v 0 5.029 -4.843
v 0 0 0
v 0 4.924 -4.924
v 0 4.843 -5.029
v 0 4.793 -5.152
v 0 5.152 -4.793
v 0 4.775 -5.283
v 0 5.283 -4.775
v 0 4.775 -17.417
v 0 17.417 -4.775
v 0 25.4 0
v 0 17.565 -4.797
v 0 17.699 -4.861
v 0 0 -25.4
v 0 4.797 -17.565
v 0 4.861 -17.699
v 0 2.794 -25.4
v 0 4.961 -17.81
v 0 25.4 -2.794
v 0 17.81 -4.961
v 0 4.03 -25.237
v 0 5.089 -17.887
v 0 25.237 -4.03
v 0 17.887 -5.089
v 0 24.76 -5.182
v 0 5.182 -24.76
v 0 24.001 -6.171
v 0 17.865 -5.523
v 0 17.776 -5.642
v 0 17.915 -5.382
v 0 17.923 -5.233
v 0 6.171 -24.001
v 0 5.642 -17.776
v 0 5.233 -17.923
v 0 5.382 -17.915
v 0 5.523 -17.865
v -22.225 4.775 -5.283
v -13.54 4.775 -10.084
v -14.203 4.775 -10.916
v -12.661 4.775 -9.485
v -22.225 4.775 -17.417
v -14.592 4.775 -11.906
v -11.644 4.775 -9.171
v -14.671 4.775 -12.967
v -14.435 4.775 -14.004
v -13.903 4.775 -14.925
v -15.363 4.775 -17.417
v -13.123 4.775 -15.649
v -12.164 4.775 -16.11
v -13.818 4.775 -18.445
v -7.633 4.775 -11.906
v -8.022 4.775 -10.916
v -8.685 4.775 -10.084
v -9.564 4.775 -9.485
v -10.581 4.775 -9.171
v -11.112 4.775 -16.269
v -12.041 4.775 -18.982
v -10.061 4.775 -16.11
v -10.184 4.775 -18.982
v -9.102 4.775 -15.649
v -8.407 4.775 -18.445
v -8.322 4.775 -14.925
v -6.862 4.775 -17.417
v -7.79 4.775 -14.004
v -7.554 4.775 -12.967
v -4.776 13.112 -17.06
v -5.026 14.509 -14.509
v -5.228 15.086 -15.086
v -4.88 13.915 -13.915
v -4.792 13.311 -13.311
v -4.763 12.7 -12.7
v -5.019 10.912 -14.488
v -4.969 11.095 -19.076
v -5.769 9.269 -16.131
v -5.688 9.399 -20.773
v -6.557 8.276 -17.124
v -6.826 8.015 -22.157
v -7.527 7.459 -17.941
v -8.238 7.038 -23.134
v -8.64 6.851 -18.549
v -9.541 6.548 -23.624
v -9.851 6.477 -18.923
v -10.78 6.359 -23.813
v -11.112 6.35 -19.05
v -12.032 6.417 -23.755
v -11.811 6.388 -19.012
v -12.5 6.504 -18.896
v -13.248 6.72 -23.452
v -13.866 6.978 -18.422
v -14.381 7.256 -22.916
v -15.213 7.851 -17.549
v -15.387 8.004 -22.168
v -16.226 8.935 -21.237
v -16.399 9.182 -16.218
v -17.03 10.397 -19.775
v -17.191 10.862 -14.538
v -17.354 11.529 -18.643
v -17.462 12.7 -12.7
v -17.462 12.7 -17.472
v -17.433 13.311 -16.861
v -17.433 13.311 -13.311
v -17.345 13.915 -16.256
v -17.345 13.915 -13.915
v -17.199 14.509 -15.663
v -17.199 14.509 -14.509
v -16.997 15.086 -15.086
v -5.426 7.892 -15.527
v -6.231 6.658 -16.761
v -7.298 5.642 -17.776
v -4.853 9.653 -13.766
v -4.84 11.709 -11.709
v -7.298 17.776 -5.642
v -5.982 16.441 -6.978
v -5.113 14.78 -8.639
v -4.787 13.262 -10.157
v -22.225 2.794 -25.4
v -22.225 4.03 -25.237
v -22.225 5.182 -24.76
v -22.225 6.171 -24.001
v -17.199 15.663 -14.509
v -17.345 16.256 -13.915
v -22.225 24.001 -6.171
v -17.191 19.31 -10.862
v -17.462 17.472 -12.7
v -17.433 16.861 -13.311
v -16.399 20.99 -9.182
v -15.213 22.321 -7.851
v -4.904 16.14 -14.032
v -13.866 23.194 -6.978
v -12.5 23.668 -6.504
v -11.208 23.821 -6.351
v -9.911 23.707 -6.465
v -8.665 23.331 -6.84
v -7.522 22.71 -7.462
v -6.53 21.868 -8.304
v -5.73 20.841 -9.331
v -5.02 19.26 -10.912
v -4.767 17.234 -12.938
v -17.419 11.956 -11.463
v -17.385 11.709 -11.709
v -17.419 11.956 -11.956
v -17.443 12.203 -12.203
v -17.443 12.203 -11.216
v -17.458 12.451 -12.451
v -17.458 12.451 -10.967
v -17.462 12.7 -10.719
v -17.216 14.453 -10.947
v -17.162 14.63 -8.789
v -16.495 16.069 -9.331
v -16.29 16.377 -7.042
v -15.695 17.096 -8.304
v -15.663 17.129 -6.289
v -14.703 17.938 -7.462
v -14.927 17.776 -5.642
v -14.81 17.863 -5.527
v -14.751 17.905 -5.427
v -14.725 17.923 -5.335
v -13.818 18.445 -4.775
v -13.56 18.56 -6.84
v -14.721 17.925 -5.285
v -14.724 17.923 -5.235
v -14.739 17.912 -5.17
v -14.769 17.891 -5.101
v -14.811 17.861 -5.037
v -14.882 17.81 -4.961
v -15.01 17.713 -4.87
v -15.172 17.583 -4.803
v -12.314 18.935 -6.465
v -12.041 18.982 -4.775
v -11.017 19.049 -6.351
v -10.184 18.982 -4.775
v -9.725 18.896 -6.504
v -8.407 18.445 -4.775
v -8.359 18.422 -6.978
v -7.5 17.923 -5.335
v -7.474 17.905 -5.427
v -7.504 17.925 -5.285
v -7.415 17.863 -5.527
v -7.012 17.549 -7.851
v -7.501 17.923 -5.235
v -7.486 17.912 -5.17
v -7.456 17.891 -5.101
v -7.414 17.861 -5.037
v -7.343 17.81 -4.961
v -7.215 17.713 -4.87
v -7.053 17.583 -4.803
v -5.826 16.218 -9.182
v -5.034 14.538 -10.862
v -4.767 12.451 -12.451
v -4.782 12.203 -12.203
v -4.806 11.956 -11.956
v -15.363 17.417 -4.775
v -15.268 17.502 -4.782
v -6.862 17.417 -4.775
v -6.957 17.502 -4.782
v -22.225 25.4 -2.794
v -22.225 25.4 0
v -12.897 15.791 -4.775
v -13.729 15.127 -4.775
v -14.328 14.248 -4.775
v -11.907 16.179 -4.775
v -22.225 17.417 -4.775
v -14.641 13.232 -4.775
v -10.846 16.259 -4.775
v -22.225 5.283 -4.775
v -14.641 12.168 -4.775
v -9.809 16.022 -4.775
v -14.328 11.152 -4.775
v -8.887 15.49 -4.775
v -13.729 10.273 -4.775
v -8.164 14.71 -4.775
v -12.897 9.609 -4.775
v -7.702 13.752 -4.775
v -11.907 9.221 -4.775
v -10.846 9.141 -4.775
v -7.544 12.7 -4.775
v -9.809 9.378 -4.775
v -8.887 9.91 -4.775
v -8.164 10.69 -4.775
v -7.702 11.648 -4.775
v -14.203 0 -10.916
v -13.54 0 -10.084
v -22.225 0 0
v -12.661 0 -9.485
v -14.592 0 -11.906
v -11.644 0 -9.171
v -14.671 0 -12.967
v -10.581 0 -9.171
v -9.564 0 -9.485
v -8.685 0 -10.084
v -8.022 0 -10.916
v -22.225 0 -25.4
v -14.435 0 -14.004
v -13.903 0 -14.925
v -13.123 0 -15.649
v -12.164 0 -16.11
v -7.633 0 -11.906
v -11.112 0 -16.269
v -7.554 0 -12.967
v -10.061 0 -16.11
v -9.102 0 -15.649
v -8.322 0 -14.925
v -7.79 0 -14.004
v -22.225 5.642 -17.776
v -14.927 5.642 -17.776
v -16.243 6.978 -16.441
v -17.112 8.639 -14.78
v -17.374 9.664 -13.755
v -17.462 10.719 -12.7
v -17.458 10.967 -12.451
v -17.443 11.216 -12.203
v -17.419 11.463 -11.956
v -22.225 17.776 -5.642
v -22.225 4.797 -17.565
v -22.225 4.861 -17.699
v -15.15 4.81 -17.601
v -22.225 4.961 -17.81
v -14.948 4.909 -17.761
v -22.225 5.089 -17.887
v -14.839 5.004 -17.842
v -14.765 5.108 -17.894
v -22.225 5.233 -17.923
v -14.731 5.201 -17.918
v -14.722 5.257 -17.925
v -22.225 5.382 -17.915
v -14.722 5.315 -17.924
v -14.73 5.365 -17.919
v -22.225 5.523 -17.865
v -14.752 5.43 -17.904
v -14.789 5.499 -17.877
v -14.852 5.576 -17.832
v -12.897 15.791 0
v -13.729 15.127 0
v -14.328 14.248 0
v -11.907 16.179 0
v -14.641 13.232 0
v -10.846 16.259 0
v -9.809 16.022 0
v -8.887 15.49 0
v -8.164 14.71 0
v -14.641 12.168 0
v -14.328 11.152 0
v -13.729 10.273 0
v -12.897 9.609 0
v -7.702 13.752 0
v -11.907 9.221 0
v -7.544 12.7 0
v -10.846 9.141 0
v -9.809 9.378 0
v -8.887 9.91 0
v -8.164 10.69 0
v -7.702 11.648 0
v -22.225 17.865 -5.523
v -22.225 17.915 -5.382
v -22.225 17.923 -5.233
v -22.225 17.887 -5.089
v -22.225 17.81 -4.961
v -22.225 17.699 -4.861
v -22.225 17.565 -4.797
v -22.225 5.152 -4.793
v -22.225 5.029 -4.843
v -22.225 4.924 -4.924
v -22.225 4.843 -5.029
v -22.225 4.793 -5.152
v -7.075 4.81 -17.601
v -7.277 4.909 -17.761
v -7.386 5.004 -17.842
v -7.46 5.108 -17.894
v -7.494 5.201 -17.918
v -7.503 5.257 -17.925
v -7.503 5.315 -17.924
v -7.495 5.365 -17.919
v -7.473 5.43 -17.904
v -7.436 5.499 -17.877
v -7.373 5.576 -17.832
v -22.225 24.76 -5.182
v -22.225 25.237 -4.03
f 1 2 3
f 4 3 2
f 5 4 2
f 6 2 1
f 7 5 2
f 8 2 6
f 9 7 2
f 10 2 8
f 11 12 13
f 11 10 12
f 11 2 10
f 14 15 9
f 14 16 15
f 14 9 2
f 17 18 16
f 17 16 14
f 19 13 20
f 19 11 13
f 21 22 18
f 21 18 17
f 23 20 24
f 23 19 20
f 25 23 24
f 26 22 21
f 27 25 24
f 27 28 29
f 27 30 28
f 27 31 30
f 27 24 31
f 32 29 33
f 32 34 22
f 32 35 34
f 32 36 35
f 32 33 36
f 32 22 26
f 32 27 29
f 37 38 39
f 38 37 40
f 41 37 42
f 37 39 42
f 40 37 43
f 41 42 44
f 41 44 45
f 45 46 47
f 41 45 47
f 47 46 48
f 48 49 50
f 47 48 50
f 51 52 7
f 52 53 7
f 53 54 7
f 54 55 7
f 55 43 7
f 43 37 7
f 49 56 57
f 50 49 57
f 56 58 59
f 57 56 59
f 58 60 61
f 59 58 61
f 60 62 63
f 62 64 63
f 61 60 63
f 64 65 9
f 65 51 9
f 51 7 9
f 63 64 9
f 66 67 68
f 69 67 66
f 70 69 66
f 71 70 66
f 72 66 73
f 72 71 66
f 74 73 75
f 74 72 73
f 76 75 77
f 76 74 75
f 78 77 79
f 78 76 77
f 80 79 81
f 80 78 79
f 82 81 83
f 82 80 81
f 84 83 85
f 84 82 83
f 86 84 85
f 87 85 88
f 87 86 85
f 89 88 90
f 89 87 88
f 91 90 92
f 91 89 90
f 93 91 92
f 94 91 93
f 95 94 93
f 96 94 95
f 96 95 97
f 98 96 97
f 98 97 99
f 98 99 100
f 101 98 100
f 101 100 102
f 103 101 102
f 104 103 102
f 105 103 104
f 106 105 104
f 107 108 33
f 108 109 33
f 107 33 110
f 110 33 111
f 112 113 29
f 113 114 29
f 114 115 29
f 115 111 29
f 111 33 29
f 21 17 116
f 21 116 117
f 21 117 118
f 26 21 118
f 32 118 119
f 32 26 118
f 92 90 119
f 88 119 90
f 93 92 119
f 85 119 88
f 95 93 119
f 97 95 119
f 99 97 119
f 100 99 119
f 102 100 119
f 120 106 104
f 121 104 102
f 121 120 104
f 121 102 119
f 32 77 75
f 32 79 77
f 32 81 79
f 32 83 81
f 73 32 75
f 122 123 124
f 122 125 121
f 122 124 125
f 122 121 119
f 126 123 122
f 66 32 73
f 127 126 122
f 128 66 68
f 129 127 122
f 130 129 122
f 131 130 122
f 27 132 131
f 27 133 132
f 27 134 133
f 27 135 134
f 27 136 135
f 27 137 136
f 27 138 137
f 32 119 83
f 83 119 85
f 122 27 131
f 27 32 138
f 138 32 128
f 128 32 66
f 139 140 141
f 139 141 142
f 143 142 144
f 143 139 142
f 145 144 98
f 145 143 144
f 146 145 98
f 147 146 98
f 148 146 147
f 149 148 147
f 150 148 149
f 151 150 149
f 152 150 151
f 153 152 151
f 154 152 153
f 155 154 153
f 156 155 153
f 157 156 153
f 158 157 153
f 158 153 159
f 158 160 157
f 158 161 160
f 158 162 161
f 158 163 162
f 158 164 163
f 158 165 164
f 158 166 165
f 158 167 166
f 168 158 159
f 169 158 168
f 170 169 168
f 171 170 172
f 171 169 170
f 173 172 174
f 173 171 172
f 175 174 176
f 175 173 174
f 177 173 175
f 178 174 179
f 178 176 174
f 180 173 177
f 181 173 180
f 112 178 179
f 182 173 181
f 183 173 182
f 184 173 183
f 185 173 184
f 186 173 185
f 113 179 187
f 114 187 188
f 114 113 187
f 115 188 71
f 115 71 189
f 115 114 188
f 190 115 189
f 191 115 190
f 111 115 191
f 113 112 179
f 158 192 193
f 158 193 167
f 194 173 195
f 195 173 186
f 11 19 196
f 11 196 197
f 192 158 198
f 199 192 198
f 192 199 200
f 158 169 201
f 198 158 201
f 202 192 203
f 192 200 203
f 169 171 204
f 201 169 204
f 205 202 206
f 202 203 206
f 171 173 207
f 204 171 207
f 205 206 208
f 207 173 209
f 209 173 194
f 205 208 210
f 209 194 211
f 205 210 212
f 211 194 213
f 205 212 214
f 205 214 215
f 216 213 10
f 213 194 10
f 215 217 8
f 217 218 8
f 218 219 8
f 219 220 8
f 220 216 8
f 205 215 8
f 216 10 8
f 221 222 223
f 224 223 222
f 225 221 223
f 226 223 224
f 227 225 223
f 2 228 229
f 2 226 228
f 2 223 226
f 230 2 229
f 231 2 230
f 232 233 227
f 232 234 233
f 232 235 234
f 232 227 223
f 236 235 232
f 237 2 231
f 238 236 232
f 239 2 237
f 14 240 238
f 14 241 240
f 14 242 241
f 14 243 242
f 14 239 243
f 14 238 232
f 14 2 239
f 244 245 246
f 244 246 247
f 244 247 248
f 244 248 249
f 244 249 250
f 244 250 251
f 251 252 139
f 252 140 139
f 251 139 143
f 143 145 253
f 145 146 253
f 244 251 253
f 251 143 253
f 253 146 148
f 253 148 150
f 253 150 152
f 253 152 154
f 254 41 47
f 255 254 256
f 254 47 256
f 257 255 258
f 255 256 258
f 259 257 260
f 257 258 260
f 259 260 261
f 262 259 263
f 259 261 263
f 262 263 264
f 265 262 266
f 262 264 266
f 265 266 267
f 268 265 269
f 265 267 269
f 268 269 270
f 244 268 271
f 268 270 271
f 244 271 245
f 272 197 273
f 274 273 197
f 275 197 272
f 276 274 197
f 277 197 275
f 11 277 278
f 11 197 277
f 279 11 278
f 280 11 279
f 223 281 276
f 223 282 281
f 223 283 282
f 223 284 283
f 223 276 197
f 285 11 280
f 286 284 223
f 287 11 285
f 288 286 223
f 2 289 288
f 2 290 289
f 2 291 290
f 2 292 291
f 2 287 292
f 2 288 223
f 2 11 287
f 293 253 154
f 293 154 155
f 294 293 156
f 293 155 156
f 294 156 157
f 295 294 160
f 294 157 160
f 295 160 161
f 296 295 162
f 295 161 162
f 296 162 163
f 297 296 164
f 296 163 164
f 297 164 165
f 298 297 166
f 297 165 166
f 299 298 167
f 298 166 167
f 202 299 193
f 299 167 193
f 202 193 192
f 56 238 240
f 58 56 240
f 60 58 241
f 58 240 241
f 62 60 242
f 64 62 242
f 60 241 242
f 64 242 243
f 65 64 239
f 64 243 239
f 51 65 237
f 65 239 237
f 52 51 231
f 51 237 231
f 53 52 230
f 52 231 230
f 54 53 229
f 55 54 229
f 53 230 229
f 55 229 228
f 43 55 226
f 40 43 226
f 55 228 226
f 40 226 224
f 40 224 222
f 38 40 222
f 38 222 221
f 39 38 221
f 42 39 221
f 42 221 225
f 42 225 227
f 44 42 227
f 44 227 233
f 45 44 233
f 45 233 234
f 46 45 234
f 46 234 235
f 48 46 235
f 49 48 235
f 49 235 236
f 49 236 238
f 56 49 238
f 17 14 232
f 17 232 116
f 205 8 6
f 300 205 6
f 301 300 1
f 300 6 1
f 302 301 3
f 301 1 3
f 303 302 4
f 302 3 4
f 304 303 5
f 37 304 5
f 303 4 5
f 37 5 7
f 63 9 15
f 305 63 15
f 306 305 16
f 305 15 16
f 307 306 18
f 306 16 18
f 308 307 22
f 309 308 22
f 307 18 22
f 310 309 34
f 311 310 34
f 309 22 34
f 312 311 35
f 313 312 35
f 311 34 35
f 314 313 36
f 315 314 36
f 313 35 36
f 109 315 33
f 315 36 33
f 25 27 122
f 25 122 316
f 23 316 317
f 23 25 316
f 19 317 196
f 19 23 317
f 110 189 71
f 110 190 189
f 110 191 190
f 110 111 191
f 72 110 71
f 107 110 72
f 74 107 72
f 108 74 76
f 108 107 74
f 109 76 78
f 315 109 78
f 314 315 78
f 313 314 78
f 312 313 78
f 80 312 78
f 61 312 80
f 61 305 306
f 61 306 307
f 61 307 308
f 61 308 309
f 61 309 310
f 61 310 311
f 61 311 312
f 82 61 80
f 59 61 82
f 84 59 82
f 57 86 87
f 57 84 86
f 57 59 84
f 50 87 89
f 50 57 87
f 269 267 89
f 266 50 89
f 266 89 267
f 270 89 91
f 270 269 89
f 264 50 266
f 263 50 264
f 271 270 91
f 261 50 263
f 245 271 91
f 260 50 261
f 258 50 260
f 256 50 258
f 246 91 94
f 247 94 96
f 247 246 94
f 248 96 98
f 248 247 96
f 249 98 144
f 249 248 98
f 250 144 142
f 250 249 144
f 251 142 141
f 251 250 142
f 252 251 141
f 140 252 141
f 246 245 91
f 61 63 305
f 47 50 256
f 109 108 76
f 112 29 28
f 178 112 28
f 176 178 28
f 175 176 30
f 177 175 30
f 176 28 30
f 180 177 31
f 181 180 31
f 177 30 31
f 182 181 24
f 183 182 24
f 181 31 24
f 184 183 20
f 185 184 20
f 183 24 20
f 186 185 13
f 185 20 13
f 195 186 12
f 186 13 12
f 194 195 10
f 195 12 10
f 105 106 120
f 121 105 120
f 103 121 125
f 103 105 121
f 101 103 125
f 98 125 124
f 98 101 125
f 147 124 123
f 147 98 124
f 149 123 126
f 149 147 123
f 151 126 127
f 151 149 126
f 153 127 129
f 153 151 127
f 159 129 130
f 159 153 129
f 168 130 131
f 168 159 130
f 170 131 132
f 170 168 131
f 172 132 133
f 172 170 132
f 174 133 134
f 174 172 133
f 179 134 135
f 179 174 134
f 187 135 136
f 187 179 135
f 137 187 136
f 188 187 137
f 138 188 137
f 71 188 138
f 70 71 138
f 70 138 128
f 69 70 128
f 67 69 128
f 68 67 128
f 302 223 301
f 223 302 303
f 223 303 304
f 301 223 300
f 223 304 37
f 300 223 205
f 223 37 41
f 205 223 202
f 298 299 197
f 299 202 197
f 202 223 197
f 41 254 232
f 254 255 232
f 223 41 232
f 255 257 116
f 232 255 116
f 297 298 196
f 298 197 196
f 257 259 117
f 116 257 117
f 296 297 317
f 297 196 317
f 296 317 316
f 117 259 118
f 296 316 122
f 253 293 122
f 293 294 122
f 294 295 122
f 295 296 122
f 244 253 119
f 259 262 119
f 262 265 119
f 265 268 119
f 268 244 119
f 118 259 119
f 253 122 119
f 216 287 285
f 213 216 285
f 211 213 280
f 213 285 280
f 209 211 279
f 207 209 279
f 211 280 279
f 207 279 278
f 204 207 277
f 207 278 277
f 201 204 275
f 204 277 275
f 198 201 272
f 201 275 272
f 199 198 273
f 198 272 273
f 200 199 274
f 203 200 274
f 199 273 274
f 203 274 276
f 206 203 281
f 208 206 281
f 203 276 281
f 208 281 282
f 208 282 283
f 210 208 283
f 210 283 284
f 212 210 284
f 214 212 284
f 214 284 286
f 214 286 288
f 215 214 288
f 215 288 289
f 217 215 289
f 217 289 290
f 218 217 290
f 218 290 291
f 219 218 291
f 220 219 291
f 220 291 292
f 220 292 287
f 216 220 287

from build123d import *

# Parameters (mm, degrees)
BASE_EXTRUDE_DEPTH = 22.225
HOLE1_REACH        = 44.241
SKETCH2_R          = 3.5687
SKETCH3_R          = 6.35
HOLE1A_DEPTH       = 40.553672
HOLE2_REACH        = 44.241
SKETCH4_R          = 3.5687
SKETCH5_R          = 6.35
HOLE2A_DEPTH       = 40.553672


with BuildPart() as part:
    # Sketch1 → Base Extrude (new body)
    with BuildSketch(Plane(origin=(0, 0, 0), x_dir=(0, 0, -1), z_dir=(1, 0, 0))):
        with BuildLine():
            Line((0, 25.4), (0, 0))
            Line((0, 0), (25.4, 0))
            Line((25.4, 0), (25.4, 2.794))
            ThreePointArc((25.4, 2.794), (25.03651, 4.62139), (24.001376, 6.170576))
            Line((24.001376, 6.170576), (6.170576, 24.001376))
            ThreePointArc((6.170576, 24.001376), (4.62139, 25.03651), (2.794, 25.4))
            Line((2.794, 25.4), (0, 25.4))
        make_face()
        with BuildLine():
            Line((4.7752, 17.41718), (4.7752, 5.2832))
            ThreePointArc((4.7752, 5.2832), (4.92399, 4.92399), (5.2832, 4.7752))
            Line((5.2832, 4.7752), (17.41718, 4.7752))
            ThreePointArc((17.41718, 4.7752), (17.88651, 5.088797), (17.77639, 5.64241))
            Line((17.77639, 5.64241), (5.64241, 17.77639))
            ThreePointArc((5.64241, 17.77639), (5.088797, 17.88651), (4.7752, 17.41718))
        make_face(mode=Mode.SUBTRACT)
    extrude(amount=-BASE_EXTRUDE_DEPTH)

    # Sketch2 → Hole1 (cut, up to next)
    with BuildSketch(Plane.XZ, mode=Mode.PRIVATE) as hole1_sk1:
        with Locations(Location((-11.1125, -12.7, 0), (0, 0, 270))):
            Circle(SKETCH2_R)
    hole1_tool1 = extrude(hole1_sk1.sketch, amount=-HOLE1_REACH, mode=Mode.PRIVATE) & part.part
    add(hole1_tool1.solids().sort_by_distance((-11.1125, 0, -12.7))[0], mode=Mode.SUBTRACT)

    # Sketch3 → Hole1a (cut, through all)
    with BuildSketch(Plane(origin=(0, 4.7752, 0), x_dir=(-1, 0, 0), z_dir=(0, 1, 0))):
        with Locations((11.1125, -12.7)):
            Circle(SKETCH3_R)
    extrude(amount=HOLE1A_DEPTH, mode=Mode.SUBTRACT)

    # Sketch4 → Hole2 (cut, up to next)
    with BuildSketch(Plane.XY, mode=Mode.PRIVATE) as hole2_sk1:
        with Locations((-11.1125, 12.7)):
            Circle(SKETCH4_R)
    hole2_tool1 = extrude(hole2_sk1.sketch, amount=-HOLE2_REACH, mode=Mode.PRIVATE) & part.part
    add(hole2_tool1.solids().sort_by_distance((-11.1125, 12.7, 0))[0], mode=Mode.SUBTRACT)

    # Sketch5 → Hole2a (cut, through all)
    with BuildSketch(Plane(origin=(0, 0, -4.7752), x_dir=(-1, 0, 0), z_dir=(0, 0, -1))):
        with Locations((11.1125, 12.7)):
            Circle(SKETCH5_R)
    extrude(amount=HOLE2A_DEPTH, mode=Mode.SUBTRACT)


solid = part.part
